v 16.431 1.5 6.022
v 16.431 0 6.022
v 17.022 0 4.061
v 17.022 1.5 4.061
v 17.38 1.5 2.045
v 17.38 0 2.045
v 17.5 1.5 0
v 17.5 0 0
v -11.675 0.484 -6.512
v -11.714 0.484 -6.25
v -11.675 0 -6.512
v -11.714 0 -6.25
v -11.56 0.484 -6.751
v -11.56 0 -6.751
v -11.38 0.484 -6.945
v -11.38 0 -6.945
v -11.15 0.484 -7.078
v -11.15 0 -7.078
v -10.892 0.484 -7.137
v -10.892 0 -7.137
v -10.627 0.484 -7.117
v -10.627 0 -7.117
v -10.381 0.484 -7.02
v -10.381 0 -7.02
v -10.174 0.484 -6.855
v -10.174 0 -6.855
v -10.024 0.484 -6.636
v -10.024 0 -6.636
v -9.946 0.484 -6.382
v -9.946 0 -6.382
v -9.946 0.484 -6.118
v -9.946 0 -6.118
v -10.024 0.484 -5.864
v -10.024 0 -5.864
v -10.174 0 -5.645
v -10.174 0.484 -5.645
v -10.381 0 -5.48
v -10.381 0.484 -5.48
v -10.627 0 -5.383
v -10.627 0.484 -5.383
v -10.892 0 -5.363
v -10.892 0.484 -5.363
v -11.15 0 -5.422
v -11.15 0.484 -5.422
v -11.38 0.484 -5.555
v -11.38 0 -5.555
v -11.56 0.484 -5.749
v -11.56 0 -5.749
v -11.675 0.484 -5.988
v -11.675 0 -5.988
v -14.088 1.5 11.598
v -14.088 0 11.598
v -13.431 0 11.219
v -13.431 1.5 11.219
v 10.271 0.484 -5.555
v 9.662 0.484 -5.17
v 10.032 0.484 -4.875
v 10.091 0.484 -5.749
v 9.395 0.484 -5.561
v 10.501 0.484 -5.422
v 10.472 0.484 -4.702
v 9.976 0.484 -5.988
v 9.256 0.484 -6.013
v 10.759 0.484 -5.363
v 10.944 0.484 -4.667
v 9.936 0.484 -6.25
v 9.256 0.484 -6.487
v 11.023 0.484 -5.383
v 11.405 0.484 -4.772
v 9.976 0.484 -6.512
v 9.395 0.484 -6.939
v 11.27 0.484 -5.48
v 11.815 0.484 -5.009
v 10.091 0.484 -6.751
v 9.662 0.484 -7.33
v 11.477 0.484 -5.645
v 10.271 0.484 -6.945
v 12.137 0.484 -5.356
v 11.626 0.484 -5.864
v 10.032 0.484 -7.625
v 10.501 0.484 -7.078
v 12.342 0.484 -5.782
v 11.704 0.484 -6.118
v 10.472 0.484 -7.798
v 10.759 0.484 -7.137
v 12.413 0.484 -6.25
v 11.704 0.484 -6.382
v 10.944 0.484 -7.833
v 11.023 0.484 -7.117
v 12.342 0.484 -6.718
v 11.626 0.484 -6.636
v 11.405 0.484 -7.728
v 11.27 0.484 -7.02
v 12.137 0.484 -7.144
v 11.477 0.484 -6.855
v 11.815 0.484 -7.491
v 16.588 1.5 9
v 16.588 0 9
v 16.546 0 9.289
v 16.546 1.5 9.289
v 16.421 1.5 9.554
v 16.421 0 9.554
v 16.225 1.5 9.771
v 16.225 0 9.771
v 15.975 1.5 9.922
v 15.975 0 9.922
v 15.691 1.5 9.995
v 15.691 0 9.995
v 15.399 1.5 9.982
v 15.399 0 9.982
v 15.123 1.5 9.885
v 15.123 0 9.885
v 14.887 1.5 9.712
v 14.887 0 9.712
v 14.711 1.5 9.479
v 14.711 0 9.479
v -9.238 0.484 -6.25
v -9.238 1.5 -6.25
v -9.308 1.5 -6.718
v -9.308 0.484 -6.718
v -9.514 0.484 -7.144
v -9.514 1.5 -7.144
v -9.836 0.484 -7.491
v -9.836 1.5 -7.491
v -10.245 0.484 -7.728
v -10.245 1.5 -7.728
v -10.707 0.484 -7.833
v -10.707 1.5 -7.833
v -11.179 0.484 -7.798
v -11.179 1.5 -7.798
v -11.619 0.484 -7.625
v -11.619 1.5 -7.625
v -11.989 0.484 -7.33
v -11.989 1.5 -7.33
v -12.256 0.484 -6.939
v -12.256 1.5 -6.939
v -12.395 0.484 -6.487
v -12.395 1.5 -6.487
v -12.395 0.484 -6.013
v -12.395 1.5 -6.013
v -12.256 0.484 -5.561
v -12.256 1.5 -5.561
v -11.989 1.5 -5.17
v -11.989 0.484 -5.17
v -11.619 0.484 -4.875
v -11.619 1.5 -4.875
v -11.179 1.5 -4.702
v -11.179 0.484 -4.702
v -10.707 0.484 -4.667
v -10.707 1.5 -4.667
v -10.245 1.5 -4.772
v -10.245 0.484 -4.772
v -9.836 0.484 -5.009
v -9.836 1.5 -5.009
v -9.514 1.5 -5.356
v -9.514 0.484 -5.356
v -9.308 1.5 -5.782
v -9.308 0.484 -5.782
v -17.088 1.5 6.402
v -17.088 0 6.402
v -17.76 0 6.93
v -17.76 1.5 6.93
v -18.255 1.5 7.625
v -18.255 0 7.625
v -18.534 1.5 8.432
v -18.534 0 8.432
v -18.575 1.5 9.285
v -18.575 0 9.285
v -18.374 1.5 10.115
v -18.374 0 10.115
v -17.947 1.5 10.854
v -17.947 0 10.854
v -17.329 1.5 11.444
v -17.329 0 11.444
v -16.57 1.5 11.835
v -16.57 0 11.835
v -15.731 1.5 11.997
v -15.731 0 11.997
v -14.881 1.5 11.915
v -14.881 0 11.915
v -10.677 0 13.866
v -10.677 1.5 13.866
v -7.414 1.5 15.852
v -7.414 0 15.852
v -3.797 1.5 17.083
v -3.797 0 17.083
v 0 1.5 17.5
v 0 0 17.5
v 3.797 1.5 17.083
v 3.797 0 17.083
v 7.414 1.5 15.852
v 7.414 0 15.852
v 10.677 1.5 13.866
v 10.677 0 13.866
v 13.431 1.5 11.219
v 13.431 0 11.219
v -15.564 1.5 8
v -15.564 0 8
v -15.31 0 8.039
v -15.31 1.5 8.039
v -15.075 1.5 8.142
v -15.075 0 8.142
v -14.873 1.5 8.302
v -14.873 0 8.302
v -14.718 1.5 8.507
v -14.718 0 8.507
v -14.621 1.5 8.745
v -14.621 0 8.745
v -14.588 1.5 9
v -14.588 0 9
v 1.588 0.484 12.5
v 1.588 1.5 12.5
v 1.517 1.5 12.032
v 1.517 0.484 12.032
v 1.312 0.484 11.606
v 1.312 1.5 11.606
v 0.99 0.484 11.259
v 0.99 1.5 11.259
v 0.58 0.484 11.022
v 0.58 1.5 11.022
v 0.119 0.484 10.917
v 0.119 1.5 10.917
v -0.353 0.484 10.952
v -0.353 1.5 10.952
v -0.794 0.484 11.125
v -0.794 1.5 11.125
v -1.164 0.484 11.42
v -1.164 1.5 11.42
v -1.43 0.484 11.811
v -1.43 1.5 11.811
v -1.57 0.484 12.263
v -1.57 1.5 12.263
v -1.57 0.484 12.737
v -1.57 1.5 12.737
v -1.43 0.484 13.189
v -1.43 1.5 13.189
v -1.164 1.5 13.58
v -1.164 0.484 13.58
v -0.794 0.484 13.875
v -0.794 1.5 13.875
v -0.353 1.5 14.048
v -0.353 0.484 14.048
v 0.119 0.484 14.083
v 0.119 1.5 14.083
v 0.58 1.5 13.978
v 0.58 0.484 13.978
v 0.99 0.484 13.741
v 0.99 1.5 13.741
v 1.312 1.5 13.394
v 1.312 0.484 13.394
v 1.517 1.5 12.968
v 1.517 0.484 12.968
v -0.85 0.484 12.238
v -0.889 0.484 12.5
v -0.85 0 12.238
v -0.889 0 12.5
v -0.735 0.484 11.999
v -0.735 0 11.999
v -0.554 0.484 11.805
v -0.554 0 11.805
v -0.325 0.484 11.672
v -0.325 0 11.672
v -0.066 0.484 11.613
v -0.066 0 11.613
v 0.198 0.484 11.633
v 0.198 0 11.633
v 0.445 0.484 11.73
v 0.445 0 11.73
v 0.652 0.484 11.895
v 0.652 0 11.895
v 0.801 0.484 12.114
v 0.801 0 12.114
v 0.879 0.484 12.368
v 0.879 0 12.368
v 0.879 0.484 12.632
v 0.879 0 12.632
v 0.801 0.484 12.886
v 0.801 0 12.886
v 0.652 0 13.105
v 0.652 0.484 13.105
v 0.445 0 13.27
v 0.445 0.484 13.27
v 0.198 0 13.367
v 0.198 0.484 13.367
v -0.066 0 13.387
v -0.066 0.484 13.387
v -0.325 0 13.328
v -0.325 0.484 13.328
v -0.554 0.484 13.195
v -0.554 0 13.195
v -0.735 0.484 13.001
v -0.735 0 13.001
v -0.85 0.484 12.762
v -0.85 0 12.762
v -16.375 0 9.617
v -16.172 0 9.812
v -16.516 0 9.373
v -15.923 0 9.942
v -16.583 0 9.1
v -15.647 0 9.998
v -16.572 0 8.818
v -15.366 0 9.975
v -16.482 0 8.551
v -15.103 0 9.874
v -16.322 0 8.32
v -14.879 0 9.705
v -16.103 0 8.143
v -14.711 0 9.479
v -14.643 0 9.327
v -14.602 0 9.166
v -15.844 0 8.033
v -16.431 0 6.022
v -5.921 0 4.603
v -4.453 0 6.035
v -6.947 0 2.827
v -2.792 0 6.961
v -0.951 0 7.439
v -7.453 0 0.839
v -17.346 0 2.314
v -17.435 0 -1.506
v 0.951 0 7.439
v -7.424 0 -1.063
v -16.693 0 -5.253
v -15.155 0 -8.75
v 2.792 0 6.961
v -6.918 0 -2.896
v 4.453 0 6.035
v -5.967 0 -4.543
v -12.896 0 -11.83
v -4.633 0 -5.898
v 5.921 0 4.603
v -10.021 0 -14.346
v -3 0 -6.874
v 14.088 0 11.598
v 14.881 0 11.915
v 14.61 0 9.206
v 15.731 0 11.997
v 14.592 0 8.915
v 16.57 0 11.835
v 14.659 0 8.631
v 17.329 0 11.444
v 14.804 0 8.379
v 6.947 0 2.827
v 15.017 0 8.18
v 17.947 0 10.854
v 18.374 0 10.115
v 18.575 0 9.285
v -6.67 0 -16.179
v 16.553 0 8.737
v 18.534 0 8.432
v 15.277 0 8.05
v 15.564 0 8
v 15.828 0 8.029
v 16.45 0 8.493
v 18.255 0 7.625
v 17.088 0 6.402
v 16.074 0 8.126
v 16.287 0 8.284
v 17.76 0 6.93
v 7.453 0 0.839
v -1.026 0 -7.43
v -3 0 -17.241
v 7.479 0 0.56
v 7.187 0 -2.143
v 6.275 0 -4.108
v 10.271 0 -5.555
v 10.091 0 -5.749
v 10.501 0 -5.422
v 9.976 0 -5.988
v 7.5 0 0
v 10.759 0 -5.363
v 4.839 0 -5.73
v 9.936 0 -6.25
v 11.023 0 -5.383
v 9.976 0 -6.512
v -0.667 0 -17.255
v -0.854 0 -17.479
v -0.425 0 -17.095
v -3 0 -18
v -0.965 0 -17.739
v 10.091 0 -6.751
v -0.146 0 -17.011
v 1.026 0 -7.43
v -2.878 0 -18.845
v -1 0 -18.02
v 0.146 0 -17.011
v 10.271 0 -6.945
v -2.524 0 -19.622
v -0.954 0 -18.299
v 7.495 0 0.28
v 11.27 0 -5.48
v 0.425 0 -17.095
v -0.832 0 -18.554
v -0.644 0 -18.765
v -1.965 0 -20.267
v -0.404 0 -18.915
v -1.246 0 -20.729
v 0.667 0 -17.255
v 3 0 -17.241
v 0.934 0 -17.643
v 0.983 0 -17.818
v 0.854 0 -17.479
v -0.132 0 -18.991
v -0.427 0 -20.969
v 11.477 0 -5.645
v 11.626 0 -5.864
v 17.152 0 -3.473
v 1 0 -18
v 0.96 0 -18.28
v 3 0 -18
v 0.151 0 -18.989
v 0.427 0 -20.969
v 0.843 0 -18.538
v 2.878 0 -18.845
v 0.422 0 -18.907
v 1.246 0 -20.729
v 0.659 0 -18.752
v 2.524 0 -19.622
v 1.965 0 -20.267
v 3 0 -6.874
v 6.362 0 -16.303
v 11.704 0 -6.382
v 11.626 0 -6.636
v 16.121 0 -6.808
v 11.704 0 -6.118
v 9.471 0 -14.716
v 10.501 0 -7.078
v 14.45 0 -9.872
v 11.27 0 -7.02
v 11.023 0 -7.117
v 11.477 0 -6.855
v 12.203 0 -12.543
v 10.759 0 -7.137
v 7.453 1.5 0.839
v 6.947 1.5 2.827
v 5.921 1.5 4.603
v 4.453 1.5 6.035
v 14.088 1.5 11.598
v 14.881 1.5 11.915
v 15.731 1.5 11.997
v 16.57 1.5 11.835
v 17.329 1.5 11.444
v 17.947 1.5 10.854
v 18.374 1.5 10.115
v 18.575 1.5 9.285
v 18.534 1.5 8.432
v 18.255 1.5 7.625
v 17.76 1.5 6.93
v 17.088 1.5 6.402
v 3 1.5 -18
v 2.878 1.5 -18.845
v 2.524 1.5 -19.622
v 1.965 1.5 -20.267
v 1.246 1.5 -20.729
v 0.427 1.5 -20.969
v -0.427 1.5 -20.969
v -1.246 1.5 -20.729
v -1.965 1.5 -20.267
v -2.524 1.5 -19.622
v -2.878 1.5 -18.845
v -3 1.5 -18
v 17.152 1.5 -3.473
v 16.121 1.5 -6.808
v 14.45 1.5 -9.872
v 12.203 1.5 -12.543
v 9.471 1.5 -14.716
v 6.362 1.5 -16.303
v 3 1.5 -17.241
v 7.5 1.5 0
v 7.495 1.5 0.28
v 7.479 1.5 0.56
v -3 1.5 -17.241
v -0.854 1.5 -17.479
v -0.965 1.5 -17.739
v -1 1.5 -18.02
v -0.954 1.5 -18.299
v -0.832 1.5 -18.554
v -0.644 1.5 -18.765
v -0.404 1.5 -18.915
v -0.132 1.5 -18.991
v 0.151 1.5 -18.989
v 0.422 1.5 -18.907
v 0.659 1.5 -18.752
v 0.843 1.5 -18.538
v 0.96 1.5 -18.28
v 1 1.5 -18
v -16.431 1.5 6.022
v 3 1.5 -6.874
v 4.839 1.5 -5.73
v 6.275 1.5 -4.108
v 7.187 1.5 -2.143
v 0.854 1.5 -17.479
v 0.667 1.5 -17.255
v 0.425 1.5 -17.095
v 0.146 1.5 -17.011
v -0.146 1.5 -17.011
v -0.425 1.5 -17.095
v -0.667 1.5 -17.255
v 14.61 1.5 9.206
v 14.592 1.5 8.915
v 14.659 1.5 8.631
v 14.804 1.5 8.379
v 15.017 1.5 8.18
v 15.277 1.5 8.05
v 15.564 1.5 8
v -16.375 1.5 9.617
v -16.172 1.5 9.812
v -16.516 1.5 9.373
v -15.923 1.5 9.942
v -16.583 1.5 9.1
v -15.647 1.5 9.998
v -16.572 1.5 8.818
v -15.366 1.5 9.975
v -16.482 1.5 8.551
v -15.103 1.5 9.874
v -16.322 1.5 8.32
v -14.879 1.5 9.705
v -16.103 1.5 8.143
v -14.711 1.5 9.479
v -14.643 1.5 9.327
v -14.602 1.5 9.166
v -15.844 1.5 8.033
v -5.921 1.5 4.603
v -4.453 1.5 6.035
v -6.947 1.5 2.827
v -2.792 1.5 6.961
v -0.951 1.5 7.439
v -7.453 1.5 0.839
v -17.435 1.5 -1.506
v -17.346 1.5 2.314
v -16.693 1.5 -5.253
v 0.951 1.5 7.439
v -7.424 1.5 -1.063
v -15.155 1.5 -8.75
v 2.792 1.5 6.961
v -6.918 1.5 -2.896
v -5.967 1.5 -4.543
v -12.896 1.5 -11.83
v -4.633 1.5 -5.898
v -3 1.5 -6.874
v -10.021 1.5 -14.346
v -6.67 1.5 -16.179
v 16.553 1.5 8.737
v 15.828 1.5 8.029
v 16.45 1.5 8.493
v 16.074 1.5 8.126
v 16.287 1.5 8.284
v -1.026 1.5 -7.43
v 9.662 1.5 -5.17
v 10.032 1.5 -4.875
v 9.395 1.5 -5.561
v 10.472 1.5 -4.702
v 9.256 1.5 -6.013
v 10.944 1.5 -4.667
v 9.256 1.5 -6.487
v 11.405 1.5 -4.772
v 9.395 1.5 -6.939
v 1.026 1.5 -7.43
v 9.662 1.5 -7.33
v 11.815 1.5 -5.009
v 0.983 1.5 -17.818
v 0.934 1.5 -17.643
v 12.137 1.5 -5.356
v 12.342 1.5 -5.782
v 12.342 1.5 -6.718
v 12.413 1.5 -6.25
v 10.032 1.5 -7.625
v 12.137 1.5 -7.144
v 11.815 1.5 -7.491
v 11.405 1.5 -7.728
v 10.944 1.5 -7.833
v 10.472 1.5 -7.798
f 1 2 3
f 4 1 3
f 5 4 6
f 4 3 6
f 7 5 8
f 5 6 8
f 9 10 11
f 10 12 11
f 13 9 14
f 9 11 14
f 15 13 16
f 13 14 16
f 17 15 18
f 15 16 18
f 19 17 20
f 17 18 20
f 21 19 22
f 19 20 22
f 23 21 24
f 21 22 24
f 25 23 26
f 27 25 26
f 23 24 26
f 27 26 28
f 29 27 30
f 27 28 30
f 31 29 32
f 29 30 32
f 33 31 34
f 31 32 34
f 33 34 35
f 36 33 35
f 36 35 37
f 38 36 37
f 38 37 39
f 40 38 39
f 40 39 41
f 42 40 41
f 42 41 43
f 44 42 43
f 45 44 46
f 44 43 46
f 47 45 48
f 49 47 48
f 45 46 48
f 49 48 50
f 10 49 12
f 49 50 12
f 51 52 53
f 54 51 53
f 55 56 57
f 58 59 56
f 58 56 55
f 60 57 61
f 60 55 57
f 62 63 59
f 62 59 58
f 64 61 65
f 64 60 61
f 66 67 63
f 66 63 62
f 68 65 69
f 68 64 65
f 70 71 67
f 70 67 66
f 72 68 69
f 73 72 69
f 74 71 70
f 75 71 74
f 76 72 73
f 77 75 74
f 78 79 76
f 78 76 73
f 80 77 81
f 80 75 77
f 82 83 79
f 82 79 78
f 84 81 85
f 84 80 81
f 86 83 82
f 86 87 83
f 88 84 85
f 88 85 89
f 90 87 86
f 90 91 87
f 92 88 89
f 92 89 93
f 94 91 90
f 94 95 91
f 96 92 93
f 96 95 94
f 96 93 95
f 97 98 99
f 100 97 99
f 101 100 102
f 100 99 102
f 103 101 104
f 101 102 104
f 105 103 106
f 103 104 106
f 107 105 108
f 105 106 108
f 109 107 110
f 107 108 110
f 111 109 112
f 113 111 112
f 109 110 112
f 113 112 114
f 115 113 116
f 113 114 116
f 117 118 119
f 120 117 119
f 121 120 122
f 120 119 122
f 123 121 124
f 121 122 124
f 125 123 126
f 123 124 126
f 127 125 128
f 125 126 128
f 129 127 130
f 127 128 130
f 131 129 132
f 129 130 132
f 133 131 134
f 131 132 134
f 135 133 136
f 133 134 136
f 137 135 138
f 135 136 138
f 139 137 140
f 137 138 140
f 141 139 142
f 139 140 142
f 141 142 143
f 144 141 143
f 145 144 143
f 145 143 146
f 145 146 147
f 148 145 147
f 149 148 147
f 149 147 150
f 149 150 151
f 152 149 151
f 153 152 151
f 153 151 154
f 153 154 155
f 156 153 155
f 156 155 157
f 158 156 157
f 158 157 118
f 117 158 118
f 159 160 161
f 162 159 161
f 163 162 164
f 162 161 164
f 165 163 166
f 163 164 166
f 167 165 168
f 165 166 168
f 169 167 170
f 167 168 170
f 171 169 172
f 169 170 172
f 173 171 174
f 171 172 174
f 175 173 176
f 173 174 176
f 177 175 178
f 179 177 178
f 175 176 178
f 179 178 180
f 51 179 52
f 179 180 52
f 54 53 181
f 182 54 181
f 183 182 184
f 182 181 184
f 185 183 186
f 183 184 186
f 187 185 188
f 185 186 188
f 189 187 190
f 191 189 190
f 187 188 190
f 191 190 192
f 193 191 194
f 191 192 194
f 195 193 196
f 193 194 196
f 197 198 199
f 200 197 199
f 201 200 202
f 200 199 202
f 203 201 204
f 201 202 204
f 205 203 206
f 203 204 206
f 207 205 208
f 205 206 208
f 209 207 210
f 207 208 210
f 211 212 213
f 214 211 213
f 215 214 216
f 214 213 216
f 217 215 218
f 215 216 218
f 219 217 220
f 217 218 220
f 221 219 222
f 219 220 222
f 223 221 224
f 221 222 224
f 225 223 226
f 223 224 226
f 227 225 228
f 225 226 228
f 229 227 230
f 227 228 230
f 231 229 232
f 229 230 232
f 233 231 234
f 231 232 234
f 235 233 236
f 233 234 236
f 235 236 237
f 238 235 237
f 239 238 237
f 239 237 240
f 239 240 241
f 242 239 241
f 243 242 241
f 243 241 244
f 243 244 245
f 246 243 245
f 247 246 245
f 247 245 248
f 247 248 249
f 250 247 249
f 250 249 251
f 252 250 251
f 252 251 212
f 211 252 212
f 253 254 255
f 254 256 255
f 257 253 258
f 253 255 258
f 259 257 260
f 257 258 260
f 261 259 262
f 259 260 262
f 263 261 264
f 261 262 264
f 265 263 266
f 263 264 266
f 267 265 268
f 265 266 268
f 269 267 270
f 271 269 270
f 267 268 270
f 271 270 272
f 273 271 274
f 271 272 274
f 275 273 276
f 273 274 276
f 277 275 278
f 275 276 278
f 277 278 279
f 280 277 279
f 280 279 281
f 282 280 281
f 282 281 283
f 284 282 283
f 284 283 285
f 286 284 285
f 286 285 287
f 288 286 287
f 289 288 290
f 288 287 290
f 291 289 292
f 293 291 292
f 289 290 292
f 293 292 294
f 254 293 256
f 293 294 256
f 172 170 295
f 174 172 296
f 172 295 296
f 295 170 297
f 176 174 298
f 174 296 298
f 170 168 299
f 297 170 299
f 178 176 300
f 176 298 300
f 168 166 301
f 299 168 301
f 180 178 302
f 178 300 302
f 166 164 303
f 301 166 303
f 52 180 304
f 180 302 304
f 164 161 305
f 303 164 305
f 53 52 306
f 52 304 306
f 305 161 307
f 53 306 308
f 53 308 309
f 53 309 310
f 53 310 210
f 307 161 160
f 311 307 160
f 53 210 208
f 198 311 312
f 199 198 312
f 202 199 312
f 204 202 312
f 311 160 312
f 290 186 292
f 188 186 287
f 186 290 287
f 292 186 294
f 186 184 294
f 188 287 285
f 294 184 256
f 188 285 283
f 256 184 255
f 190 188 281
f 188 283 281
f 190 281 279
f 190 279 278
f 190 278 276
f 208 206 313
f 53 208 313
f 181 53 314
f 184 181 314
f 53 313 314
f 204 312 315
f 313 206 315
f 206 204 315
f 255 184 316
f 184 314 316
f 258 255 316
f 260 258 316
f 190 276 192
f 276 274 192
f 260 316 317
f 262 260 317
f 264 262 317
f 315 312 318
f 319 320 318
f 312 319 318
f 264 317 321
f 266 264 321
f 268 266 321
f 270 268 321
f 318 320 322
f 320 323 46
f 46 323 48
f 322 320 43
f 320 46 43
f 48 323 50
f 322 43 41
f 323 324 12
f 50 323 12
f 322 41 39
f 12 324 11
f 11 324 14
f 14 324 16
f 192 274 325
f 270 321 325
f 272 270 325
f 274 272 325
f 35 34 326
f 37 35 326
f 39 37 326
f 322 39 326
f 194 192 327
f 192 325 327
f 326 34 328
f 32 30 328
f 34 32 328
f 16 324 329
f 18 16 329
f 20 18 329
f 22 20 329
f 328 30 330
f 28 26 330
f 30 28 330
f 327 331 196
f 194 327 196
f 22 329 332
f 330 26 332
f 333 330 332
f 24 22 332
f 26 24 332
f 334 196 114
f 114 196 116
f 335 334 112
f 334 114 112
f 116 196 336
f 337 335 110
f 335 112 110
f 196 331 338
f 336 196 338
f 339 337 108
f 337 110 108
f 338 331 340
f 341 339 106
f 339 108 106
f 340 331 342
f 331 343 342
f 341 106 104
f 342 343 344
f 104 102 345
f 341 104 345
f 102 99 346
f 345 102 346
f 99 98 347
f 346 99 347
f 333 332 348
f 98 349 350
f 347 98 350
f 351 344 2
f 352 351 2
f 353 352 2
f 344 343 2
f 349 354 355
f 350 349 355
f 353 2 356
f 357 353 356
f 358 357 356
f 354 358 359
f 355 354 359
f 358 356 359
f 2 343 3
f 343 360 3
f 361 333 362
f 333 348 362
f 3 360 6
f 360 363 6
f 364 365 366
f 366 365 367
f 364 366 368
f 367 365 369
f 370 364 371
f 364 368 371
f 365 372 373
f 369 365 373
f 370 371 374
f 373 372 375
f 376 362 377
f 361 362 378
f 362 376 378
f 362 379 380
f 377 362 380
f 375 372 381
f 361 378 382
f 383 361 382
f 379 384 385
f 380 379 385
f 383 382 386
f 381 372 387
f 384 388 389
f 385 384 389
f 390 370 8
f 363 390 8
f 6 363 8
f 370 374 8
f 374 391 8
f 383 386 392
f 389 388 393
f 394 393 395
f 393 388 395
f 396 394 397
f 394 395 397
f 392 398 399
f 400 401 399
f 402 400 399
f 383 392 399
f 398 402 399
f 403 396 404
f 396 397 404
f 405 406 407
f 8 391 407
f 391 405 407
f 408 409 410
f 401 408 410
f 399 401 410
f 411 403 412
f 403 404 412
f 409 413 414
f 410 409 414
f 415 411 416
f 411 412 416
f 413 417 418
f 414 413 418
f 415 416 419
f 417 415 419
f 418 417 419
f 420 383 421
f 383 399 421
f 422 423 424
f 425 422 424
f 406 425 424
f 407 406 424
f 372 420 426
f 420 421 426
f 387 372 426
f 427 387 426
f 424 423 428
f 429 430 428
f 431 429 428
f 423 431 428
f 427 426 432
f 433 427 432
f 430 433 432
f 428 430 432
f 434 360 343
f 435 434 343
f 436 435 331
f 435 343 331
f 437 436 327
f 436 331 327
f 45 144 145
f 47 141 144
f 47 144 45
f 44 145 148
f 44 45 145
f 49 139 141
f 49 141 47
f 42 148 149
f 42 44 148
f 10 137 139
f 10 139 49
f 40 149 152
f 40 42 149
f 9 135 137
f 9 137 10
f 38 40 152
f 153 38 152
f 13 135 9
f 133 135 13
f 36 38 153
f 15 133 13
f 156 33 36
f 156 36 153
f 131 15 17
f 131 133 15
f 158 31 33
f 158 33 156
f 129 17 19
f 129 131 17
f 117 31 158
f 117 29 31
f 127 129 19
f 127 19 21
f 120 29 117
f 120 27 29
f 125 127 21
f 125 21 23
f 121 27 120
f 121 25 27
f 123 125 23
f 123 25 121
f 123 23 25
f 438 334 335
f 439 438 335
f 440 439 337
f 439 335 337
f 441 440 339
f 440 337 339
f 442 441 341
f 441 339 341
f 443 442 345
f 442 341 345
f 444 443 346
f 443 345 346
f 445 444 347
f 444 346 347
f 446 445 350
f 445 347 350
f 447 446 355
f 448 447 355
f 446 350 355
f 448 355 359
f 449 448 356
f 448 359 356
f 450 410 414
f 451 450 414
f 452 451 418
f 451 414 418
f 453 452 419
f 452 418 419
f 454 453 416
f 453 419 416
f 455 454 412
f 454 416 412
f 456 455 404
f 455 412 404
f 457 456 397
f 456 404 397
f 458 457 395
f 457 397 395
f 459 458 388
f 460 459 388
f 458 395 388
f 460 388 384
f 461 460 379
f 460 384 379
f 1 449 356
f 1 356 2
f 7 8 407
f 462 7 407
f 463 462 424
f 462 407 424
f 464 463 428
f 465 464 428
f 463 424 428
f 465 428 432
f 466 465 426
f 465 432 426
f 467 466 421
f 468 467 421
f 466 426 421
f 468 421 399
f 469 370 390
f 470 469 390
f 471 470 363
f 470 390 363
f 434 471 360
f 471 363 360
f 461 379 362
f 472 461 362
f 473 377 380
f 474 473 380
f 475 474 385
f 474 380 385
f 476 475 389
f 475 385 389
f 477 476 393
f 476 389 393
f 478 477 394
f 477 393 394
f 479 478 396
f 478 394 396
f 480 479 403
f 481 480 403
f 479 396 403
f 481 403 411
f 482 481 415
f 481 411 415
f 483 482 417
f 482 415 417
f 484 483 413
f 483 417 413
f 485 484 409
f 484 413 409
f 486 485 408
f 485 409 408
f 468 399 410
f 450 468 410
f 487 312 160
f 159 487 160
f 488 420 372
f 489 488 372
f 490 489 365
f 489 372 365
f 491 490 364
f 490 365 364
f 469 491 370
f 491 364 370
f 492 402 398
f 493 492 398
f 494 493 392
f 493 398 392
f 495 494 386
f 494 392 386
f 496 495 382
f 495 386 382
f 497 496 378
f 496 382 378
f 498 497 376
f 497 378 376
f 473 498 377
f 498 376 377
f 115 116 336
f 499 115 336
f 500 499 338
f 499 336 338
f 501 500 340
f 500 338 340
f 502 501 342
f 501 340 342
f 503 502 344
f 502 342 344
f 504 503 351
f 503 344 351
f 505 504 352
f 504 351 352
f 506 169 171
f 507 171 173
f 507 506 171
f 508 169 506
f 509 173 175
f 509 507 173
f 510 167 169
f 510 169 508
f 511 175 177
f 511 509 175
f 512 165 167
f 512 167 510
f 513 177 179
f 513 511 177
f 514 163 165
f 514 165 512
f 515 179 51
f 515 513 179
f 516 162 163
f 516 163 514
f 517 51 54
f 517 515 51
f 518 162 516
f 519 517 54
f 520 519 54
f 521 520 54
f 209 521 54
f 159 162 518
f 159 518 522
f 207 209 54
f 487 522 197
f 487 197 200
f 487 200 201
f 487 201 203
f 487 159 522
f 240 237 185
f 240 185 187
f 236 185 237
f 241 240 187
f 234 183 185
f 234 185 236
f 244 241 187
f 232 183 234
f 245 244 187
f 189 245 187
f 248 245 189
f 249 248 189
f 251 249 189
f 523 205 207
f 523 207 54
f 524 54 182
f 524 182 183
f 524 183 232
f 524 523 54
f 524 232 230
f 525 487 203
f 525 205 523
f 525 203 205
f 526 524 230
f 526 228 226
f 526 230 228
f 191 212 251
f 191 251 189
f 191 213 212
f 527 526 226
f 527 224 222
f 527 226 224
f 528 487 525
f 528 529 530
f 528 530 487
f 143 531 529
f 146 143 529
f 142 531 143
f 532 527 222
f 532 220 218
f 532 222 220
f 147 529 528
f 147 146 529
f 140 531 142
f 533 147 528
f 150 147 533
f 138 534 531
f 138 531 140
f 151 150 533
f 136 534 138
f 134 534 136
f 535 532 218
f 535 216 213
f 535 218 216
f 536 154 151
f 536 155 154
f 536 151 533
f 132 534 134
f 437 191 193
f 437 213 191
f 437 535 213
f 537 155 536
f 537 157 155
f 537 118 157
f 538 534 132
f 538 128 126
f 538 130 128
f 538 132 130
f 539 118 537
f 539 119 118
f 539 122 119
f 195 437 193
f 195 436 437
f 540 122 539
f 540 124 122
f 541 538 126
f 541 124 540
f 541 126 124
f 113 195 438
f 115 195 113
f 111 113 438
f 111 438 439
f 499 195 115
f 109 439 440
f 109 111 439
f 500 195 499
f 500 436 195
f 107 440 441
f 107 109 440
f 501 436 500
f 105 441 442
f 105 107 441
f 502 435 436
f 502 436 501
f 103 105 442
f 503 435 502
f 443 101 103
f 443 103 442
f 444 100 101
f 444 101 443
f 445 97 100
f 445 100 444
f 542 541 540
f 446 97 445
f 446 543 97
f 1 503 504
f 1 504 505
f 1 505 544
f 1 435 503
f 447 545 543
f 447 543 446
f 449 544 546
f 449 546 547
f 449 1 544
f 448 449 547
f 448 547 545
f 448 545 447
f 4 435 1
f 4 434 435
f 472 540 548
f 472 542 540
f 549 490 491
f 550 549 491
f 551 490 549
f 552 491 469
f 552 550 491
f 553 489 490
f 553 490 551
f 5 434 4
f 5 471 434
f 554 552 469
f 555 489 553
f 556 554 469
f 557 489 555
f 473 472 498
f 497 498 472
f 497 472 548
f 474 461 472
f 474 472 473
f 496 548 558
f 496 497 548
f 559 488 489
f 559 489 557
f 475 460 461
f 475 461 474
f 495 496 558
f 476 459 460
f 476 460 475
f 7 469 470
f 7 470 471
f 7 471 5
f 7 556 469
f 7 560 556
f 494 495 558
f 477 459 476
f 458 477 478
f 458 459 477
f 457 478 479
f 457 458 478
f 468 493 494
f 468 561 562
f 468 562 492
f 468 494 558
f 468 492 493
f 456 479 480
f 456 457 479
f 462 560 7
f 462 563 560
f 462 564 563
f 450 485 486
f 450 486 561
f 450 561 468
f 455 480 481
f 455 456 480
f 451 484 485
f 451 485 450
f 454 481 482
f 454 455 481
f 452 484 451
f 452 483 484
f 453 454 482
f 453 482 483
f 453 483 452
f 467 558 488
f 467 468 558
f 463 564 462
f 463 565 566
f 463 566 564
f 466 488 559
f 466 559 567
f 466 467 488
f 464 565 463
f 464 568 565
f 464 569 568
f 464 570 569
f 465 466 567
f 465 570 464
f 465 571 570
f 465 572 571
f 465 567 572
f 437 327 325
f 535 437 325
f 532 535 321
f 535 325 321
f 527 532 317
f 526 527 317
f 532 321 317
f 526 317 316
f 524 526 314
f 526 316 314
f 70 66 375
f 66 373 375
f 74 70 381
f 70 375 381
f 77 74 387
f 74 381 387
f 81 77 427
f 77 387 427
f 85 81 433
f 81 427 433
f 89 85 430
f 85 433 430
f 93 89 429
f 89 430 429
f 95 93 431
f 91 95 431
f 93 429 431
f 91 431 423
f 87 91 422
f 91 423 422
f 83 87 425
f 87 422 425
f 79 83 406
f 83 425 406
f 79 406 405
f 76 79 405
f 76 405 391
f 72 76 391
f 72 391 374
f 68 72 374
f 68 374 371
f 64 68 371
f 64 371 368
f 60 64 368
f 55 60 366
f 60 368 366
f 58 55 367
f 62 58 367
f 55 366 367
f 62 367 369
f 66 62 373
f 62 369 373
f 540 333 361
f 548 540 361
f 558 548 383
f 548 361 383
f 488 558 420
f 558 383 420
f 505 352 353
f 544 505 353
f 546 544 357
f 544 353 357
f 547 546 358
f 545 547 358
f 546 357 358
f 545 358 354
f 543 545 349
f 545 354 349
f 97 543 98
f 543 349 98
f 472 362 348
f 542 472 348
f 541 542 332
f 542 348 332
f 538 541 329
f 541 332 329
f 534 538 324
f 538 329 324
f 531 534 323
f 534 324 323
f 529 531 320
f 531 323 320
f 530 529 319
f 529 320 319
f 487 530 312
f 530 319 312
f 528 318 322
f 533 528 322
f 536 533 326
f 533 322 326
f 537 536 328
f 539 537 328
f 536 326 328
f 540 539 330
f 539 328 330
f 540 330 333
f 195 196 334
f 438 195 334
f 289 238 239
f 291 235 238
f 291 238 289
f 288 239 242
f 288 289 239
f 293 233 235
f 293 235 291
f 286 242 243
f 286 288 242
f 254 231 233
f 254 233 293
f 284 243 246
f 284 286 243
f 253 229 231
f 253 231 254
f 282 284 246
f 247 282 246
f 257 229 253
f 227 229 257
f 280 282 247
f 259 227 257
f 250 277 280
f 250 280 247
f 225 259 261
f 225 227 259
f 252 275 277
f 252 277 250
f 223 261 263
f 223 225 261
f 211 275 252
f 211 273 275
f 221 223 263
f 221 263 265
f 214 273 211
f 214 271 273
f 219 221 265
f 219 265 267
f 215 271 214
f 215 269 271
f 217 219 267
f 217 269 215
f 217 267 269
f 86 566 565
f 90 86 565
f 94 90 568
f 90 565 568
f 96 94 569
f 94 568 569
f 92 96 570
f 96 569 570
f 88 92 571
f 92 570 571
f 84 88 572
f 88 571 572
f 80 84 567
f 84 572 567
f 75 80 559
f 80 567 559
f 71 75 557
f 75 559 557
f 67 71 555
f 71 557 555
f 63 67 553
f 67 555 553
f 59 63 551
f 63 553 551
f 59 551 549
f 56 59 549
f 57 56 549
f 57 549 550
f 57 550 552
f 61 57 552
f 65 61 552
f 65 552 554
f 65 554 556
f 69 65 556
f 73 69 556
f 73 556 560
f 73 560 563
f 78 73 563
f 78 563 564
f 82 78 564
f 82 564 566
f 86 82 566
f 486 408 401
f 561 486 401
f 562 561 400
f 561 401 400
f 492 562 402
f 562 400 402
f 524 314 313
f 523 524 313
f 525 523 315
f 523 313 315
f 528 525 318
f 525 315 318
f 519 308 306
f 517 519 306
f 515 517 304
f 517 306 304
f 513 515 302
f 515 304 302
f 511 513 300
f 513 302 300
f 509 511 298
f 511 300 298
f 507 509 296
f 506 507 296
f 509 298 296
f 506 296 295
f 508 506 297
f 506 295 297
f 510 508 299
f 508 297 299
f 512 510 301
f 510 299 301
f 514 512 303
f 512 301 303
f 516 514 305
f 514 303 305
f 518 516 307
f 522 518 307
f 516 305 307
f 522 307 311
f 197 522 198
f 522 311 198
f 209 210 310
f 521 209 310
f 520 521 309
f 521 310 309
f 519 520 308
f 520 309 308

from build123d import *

# Parameters (mm, degrees)
BOSS_EXTRUDE1_DEPTH                            = 1.5
CBORE_FOR_0_SOCKET_HEAD_CAP_SCREW1_D           = 1.778
CBORE_FOR_0_SOCKET_HEAD_CAP_SCREW1_CBORE_D     = 3.175
CBORE_FOR_0_SOCKET_HEAD_CAP_SCREW1_CBORE_DEPTH = 1.016


with BuildPart() as part:
    # Sketch1 → Boss-Extrude1 (new body)
    with BuildSketch(Plane(origin=(0, 0, 0), x_dir=(1, 0, 0), z_dir=(0, 1, 0))):
        with BuildLine():
            ThreePointArc((-15.564231563, -8.000293485), (-16.028200148, -7.024727753), (-16.431091722, -6.022393613))
            Line((-16.431091722, -6.022393613), (-17.088457268, -6.401923789))
            ThreePointArc((-17.088457268, -6.401923789), (-18.186533479, -10.5), (-14.088457268, -11.598076211))
            Line((-14.088457268, -11.598076211), (-13.431091722, -11.218546036))
            ThreePointArc((-13.431091722, -11.218546036), (-14.097692763, -10.368464629), (-14.710573178, -9.478873181))
            ThreePointArc((-14.710573178, -9.478873181), (-16.454482672, -9.5), (-15.564231563, -8.000293485))
        make_face()
        with BuildLine():
            ThreePointArc((-7.45294045, -0.83885556), (-6.495190528, 3.75), (-3, 6.873863542))
            Line((-3, 6.873863542), (-3, 17.24093965))
            ThreePointArc((-3, 17.24093965), (-15.155444566, 8.75), (-16.431091722, -6.022393613))
            Line((-16.431091722, -6.022393613), (-7.45294045, -0.83885556))
        make_face()
        with BuildLine():
            ThreePointArc((-4.45294045, -6.035007983), (-6.495190528, -3.75), (-7.45294045, -0.83885556))
            Line((-7.45294045, -0.83885556), (-16.431091722, -6.022393613))
            ThreePointArc((-16.431091722, -6.022393613), (-16.028200148, -7.024727753), (-15.564231563, -8.000293485))
            ThreePointArc((-15.564231563, -8.000293485), (-14.872836662, -8.301510811), (-14.588457268, -9))
            ThreePointArc((-14.588457268, -9), (-14.619467049, -9.247099079), (-14.710573178, -9.478873181))
            ThreePointArc((-14.710573178, -9.478873181), (-14.097692763, -10.368464629), (-13.431091722, -11.218546036))
            Line((-13.431091722, -11.218546036), (-4.45294045, -6.035007983))
        make_face()
        with BuildLine():
            ThreePointArc((4.45294045, -6.035007983), (0, -7.5), (-4.45294045, -6.035007983))
            Line((-4.45294045, -6.035007983), (-13.431091722, -11.218546036))
            ThreePointArc((-13.431091722, -11.218546036), (0, -17.5), (13.431091722, -11.218546036))
            Line((13.431091722, -11.218546036), (4.45294045, -6.035007983))
        make_face()
        with BuildLine():
            ThreePointArc((7.45294045, -0.83885556), (6.495190528, -3.75), (4.45294045, -6.035007983))
            Line((4.45294045, -6.035007983), (13.431091722, -11.218546036))
            ThreePointArc((13.431091722, -11.218546036), (14.097692763, -10.368464629), (14.710573178, -9.478873181))
            ThreePointArc((14.710573178, -9.478873181), (14.722431864, -8.5), (15.564231563, -8.000293485))
            ThreePointArc((15.564231563, -8.000293485), (16.028200148, -7.024727753), (16.431091722, -6.022393613))
            Line((16.431091722, -6.022393613), (7.45294045, -0.83885556))
        make_face()
        with BuildLine():
            Line((3, 17.24093965), (3, 6.873863542))
            ThreePointArc((3, 6.873863542), (6.274950199, 4.107919181), (7.5, 0))
            ThreePointArc((7.5, 0), (7.48822587, -0.420087268), (7.45294045, -0.83885556))
            Line((7.45294045, -0.83885556), (16.431091722, -6.022393613))
            ThreePointArc((16.431091722, -6.022393613), (17.230700873, -3.05825889), (17.5, 0))
            ThreePointArc((17.5, 0), (13.393095236, 11.263880326), (3, 17.24093965))
        make_face()
        with BuildLine():
            Line((-3, 18), (-3, 17.24093965))
            ThreePointArc((-3, 17.24093965), (-1.930507386, 17.393192382), (-0.853658385, 17.479166667))
            ThreePointArc((-0.853658385, 17.479166667), (-0.27050103, 18.962719685), (1, 18))
            ThreePointArc((1, 18), (0.962719685, 17.72949897), (0.853658385, 17.479166667))
            ThreePointArc((0.853658385, 17.479166667), (1.930507386, 17.393192382), (3, 17.24093965))
            Line((3, 17.24093965), (3, 18))
            ThreePointArc((3, 18), (0, 21), (-3, 18))
        make_face()
        with BuildLine():
            Line((-3, 17.24093965), (-3, 6.873863542))
            ThreePointArc((-3, 6.873863542), (0, 7.5), (3, 6.873863542))
            Line((3, 6.873863542), (3, 17.24093965))
            ThreePointArc((3, 17.24093965), (1.930507386, 17.393192382), (0.853658385, 17.479166667))
            ThreePointArc((0.853658385, 17.479166667), (0, 17), (-0.853658385, 17.479166667))
            ThreePointArc((-0.853658385, 17.479166667), (-1.930507386, 17.393192382), (-3, 17.24093965))
        make_face()
        with BuildLine():
            ThreePointArc((14.710573178, -9.478873181), (14.097692763, -10.368464629), (13.431091722, -11.218546036))
            Line((13.431091722, -11.218546036), (14.088457268, -11.598076211))
            ThreePointArc((14.088457268, -11.598076211), (18.186533479, -10.5), (17.088457268, -6.401923789))
            Line((17.088457268, -6.401923789), (16.431091722, -6.022393613))
            ThreePointArc((16.431091722, -6.022393613), (16.028200148, -7.024727753), (15.564231563, -8.000293485))
            ThreePointArc((15.564231563, -8.000293485), (16.286946457, -8.284379393), (16.588457268, -9))
            ThreePointArc((16.588457268, -9), (15.835556347, -9.968990219), (14.710573178, -9.478873181))
        make_face()
    extrude(amount=BOSS_EXTRUDE1_DEPTH)

    # CBORE for #0 Socket Head Cap Screw1 (through all)
    with Locations(Plane(origin=(0, 1.5, 0), x_dir=(1, 0, 0), z_dir=(0, 1, 0))):
        with Locations((-10.825317547, 6.25), (10.825317547, 6.25), (0, -12.5)):
            CounterBoreHole(CBORE_FOR_0_SOCKET_HEAD_CAP_SCREW1_D / 2, CBORE_FOR_0_SOCKET_HEAD_CAP_SCREW1_CBORE_D / 2, CBORE_FOR_0_SOCKET_HEAD_CAP_SCREW1_CBORE_DEPTH)


solid = part.part
